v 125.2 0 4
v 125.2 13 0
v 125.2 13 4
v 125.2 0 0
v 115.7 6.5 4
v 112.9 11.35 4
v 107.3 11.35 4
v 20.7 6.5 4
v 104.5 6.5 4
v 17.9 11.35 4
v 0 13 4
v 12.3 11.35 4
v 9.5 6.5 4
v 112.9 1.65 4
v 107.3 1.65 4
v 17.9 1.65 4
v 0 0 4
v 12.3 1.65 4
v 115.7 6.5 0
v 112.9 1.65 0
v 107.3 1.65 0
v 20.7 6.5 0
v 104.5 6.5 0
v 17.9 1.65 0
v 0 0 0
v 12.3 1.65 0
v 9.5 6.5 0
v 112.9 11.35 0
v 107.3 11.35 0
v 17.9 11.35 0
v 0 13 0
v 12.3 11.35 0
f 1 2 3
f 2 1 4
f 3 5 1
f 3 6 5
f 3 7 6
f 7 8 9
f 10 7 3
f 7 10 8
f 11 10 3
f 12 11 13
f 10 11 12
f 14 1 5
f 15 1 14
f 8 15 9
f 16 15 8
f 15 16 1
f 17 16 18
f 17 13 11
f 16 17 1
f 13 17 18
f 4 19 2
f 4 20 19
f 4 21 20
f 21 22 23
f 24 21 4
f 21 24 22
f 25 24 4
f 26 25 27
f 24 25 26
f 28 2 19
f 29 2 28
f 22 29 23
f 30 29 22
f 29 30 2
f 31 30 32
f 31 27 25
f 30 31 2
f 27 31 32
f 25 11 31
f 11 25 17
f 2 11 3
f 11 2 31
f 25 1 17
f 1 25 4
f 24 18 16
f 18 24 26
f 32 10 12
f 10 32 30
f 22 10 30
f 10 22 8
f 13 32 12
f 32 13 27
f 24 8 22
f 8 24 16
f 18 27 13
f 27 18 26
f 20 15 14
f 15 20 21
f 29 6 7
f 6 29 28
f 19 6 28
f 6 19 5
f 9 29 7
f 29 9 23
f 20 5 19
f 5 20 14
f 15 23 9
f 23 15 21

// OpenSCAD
x = 125.2;
y = 13;
hole_d = 11.2;
hole_dist = 95;
h = 4;

contour = 1;
contour_h = h+2;


difference() {
cube([x, y, h]);

translate([0.5*(x-hole_dist), 0.5*y, 0]) cylinder(d=hole_d, h=h, $fn=6);
translate([0.5*(x+hole_dist), 0.5*y, 0]) cylinder(d=hole_d, h=h, $fn=6);
    
}


/*
translate([-contour, -contour, 0]) cube([x+2*contour, contour, contour_h]);
translate([-contour, 0, 0]) cube([contour, y, contour_h]);
translate([x, 0, 0]) cube([contour, y, contour_h]);
*/
